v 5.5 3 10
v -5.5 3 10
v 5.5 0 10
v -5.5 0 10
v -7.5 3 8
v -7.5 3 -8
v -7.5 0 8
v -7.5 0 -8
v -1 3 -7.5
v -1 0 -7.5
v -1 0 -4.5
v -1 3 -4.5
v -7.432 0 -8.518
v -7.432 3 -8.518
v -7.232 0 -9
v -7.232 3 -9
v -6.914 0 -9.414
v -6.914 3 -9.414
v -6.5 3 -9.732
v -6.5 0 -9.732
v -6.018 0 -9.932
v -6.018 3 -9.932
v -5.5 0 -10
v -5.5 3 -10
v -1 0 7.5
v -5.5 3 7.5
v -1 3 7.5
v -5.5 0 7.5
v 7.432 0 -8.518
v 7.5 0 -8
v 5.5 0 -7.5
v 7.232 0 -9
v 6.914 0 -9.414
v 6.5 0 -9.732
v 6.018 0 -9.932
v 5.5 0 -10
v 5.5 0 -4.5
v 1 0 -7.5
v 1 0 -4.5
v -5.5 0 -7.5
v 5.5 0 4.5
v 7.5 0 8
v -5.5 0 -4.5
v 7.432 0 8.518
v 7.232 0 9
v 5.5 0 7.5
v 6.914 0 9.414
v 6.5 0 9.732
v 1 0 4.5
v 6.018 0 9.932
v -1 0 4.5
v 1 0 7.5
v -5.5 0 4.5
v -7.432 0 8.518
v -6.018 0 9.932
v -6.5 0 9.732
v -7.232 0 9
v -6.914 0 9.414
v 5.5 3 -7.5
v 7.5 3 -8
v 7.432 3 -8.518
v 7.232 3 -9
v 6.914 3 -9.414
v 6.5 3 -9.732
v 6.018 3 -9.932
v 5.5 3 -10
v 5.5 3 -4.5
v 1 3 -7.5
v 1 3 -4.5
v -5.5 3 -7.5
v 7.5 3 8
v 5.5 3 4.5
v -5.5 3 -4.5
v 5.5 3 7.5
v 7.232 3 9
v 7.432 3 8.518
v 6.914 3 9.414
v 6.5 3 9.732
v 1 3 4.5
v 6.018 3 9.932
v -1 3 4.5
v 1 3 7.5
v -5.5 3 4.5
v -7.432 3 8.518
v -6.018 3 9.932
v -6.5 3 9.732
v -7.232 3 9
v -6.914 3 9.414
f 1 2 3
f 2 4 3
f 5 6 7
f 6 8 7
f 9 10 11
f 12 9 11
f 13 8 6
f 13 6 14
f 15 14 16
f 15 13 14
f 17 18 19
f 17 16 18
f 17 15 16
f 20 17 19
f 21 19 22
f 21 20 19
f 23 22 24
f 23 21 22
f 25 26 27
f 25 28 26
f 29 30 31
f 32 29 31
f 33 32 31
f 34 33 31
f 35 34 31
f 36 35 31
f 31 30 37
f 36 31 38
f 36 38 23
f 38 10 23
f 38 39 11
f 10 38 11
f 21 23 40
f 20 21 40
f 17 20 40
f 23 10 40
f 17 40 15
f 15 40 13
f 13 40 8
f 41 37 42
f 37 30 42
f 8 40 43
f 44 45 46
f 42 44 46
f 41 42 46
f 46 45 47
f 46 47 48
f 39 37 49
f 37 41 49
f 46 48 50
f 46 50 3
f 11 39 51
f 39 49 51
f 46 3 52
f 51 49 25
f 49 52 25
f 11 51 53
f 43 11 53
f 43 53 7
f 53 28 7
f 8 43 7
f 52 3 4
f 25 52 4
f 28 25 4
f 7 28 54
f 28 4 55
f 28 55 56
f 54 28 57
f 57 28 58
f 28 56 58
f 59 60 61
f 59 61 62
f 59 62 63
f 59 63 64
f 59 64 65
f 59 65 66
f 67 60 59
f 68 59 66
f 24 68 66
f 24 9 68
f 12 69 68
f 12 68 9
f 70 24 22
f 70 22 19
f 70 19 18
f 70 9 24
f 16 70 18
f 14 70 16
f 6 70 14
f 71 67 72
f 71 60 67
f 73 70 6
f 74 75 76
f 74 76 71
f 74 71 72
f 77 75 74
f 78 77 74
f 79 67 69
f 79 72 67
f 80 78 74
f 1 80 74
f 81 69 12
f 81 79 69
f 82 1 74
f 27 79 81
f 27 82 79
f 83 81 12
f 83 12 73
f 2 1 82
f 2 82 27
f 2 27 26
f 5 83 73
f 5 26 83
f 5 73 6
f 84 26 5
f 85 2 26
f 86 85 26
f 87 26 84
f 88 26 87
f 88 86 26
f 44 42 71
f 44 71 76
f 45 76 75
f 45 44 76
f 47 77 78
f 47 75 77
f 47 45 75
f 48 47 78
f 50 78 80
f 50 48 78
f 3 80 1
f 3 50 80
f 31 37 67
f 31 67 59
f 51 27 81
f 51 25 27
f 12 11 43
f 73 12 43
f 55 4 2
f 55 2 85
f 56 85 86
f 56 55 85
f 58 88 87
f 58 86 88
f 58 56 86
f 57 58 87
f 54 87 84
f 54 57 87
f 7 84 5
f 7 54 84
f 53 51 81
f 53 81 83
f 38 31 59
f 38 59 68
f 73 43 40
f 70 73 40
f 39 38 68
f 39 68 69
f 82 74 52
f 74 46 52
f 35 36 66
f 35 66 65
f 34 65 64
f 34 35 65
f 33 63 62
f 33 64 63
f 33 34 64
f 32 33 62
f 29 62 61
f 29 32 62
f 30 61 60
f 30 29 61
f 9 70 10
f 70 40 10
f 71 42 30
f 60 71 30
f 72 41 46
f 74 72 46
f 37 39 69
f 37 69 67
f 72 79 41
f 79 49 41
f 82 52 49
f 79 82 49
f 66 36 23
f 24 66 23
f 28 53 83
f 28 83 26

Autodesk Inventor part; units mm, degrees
ref_plane "YZ Plane" through (0, 0, 0) normal (1, 0, 0) x (0, 1, 0)
ref_plane "XZ Plane" through (0, 0, 0) normal (0, 1, 0) x (-1, 0, 0)
ref_plane "XY Plane" through (0, 0, 0) normal (0, 0, 1) x (1, 0, 0)
sketch "Sketch1" plane through (0, 0, 0) normal (0, 1, 0) x (-1, 0, 0)
  line L0 (5.5, 10) -> (-5.5, 10)
  line L1 (-7.5, 8) -> (-7.5, -8)
  line L2 (-5.5, -10) -> (5.5, -10)
  line L3 (7.5, -8) -> (7.5, 8)
  line L4 (7.5, 10) -> (-7.5, -10) construction
  line L5 (-7.5, 10) -> (7.5, -10) construction
  arc A0 (7.5, 8) -> (5.5, 10) centre (5.5, 8) ccw
  arc A1 (-5.5, 10) -> (-7.5, 8) centre (-5.5, 8) ccw
  arc A2 (-7.5, -8) -> (-5.5, -10) centre (-5.5, -8) ccw
  arc A3 (5.5, -10) -> (7.5, -8) centre (5.5, -8) ccw
  line L6 (5.5, 7.5) -> (1, 7.5)
  line L7 (1, 7.5) -> (1, 4.5)
  line L8 (1, 4.5) -> (5.5, 4.5)
  line L9 (5.5, 4.5) -> (5.5, 7.5)
  line L10 (0, 0) -> (2.8076, 0) construction
  line L11 (0, 0) -> (0, 2.1917) construction
  line L12 (5.5, -7.5) -> (1, -7.5)
  line L13 (1, -7.5) -> (1, -4.5)
  line L14 (1, -4.5) -> (5.5, -4.5)
  line L15 (5.5, -4.5) -> (5.5, -7.5)
  line L16 (-7.5, 10) -> (7.5, -10) construction
  line L17 (-5.5, 7.5) -> (-1, 7.5)
  line L18 (-1, 7.5) -> (-1, 4.5)
  line L19 (-1, 4.5) -> (-5.5, 4.5)
  line L20 (-5.5, 4.5) -> (-5.5, 7.5)
  line L21 (-5.5, -4.5) -> (-5.5, -7.5)
  line L22 (-5.5, -7.5) -> (-1, -7.5)
  line L23 (-1, -7.5) -> (-1, -4.5)
  line L24 (-1, -4.5) -> (-5.5, -4.5)
  point P0 (-5.5, 8)
  point P1 (-5.5, -8)
  dimension "d2" = 2
  dimension "d3" = 2
  dimension "d4" = 16
  dimension "d5" = 11
  dimension "d9" = 4.5
  dimension "d10" = 3
  dimension "d11" = 2.5
  dimension "d12" = 2
extrude "Extrusion1" add sketch "Sketch1" along normal blind 3
properties part number "Hinge_Base"
